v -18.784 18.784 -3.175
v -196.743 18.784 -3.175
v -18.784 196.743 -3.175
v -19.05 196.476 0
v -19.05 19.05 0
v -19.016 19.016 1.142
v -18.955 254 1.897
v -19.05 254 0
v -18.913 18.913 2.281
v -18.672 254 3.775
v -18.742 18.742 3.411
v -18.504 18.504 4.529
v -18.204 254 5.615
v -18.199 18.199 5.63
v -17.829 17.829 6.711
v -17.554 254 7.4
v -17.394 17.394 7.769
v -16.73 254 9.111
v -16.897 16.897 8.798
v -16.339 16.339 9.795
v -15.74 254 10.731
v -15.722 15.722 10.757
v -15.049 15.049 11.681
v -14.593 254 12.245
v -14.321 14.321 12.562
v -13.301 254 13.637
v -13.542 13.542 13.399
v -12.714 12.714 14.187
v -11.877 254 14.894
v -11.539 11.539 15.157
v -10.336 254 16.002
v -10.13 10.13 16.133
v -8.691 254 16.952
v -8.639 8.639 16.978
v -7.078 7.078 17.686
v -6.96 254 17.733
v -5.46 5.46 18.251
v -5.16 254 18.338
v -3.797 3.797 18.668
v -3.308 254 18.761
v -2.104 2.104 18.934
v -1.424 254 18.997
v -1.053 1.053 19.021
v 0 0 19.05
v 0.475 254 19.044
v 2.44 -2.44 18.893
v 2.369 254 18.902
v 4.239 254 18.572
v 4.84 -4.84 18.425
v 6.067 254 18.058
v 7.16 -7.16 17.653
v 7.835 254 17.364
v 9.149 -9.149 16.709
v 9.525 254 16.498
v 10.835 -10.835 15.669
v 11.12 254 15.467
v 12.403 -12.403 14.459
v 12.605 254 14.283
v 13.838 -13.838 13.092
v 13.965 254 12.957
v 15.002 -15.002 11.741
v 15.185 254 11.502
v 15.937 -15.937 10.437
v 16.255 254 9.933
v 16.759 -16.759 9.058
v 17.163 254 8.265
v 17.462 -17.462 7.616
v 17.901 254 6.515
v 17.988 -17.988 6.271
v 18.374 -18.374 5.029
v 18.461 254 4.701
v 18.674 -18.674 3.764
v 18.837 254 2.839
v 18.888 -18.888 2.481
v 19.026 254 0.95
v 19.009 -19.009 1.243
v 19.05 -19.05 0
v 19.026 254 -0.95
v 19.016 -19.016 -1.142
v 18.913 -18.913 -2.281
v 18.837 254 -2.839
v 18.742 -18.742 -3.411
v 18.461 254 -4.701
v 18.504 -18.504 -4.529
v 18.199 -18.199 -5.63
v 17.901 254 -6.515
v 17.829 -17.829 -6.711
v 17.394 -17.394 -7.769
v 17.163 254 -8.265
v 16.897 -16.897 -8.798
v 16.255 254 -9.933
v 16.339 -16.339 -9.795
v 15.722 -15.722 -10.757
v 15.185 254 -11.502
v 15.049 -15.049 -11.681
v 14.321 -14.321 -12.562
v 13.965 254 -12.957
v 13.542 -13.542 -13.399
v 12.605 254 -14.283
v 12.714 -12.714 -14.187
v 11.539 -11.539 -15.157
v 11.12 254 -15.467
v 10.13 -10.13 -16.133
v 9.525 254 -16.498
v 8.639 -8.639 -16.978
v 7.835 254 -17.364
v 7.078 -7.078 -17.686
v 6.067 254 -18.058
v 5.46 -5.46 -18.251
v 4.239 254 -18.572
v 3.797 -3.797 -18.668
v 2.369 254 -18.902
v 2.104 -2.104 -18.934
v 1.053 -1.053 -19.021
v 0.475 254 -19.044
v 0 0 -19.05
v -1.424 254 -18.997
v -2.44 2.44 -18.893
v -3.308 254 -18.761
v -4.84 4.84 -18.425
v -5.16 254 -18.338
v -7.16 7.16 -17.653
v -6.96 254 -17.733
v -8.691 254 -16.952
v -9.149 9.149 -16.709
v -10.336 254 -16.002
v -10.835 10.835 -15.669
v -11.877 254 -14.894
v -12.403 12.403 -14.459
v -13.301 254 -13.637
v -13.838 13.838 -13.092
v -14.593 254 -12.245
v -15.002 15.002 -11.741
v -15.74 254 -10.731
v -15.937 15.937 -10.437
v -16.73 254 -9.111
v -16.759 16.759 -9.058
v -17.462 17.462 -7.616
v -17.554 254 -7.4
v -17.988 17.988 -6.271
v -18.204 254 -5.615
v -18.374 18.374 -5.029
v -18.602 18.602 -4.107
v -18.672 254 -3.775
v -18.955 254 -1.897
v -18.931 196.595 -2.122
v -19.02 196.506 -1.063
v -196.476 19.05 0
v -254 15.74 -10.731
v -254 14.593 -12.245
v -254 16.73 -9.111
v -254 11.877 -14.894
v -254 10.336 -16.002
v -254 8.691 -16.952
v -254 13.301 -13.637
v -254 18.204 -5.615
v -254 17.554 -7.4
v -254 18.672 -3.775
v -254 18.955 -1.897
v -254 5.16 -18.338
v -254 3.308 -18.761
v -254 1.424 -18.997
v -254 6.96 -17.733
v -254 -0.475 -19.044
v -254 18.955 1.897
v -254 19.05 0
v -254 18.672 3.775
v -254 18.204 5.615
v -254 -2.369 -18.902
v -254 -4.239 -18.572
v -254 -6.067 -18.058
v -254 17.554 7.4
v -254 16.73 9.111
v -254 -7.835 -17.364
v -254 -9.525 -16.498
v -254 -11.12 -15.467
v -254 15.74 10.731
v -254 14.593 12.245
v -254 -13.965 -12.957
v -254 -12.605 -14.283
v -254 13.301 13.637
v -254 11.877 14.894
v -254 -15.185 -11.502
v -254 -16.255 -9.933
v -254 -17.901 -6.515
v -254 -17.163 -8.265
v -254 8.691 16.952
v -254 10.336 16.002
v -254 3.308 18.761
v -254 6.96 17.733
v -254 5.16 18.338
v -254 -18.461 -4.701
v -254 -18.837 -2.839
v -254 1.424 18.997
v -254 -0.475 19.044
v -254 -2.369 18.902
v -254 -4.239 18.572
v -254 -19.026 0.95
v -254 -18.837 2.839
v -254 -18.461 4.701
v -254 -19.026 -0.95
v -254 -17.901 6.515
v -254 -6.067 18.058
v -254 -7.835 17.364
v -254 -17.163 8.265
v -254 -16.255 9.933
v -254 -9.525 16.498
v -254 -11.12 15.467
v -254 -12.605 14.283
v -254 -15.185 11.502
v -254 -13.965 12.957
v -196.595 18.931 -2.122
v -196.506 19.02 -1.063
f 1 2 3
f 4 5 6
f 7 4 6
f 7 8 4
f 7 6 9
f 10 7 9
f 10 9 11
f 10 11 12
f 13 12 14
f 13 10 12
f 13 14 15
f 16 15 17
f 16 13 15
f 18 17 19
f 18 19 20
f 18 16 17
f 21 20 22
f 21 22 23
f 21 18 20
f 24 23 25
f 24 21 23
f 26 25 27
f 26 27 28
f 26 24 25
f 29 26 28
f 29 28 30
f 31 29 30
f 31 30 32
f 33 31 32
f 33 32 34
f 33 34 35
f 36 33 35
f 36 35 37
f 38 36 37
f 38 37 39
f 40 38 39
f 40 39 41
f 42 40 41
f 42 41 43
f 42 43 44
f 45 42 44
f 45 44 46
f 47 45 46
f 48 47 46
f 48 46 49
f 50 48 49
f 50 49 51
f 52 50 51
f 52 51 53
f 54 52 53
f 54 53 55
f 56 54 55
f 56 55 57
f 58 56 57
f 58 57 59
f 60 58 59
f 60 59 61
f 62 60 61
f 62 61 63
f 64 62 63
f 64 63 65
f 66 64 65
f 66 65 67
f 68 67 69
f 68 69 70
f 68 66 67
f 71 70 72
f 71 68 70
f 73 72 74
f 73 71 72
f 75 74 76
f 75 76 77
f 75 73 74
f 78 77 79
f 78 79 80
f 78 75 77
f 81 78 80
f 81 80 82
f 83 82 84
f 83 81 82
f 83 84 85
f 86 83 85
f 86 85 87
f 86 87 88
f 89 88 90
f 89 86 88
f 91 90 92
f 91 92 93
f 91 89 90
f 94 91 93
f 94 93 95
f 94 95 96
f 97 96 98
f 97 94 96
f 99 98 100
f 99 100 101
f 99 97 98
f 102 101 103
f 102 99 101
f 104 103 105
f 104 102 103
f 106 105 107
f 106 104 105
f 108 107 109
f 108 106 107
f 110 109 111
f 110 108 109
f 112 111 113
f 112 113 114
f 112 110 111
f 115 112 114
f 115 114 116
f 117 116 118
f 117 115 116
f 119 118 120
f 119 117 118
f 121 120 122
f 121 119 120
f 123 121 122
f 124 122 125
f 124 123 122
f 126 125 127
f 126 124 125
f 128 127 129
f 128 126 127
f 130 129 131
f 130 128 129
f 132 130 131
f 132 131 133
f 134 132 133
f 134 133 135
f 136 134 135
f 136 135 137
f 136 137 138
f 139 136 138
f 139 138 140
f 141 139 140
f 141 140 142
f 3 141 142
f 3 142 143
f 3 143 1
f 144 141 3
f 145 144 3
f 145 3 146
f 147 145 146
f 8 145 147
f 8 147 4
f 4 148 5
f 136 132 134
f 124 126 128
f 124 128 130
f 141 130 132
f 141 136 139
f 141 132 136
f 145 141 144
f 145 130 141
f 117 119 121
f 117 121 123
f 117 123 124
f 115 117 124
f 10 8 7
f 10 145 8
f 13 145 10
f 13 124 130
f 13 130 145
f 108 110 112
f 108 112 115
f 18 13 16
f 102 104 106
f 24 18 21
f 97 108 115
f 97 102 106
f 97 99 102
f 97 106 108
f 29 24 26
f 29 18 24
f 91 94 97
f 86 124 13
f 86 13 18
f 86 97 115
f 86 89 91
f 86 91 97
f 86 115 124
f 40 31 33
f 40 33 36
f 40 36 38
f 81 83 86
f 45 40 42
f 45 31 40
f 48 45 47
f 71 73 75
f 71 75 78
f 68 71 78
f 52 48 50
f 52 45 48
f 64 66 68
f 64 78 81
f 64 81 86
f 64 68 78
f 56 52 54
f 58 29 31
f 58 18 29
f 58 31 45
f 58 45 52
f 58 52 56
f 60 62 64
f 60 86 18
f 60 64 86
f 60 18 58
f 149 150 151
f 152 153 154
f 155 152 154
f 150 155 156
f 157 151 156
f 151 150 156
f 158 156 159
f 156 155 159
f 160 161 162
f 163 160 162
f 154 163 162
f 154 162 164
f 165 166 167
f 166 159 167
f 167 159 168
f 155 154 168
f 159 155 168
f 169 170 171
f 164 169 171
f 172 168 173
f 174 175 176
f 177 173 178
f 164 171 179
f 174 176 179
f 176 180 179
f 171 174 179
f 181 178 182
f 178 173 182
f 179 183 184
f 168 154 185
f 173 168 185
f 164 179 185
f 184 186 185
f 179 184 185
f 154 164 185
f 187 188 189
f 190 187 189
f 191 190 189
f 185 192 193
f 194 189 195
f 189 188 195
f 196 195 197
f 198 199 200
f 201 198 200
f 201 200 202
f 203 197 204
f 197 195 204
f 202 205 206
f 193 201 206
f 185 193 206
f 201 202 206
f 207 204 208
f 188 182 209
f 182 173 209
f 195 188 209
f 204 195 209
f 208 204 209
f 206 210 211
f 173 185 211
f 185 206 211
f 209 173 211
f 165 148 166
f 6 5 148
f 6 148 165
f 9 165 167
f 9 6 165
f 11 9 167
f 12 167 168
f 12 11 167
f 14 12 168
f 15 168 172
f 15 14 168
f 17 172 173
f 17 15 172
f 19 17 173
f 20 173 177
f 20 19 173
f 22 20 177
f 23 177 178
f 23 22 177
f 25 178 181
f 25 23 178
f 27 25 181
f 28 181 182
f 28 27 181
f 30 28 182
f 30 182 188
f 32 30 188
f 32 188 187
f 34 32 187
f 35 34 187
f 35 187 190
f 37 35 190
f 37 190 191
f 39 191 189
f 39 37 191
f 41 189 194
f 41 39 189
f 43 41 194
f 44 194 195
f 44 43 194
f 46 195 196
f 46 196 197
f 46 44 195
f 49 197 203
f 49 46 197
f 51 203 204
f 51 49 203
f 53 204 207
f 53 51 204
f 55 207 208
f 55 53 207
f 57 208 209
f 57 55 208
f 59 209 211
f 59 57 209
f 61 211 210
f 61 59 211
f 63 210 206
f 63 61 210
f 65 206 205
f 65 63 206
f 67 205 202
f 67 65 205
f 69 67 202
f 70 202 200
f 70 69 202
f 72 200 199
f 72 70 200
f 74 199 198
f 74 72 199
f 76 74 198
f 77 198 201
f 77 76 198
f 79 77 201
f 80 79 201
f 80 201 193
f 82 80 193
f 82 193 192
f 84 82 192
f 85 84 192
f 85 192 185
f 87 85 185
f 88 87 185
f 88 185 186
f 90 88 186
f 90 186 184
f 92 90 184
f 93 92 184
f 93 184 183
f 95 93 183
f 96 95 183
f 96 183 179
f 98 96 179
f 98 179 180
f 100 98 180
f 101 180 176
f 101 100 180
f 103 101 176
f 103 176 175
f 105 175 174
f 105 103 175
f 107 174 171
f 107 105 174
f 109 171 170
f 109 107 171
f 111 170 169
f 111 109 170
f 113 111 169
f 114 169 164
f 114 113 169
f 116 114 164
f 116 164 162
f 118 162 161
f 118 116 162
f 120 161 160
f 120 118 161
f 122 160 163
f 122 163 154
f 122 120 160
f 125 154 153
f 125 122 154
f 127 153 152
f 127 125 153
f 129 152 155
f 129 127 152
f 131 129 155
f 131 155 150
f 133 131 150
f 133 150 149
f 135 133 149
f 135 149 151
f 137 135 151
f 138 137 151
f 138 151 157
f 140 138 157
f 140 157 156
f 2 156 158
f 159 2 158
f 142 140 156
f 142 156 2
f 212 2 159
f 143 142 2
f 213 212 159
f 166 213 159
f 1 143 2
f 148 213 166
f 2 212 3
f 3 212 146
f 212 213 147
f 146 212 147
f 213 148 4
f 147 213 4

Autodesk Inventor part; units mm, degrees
ref_plane "YZ Plane" through (0, 0, 0) normal (1, 0, 0) x (0, 1, 0)
ref_plane "XZ Plane" through (0, 0, 0) normal (0, 1, 0) x (-1, 0, 0)
sketch "Sketch1" plane through (0, 0, 0) normal (0, 0, 1) x (1, 0, 0)
  line L0 (-254, 0) -> (0, 0)
  line L1 (0, 0) -> (0, 254)
  line L2 (-215.5261, 0) -> (0, 215.5261)
  dimension "d0" = 254
  dimension "d1" = 254
  dimension "d2" = 90
  dimension "d5" = 152.4
  dimension "d6" = 45
ref_plane "Work Plane1" through (-254, 0, 0) normal (1, 0, 0) x (0, 1, 0)
sketch "Sketch2" plane through (-254, 0, 0) normal (1, 0, 0) x (0, 1, 0)
  circle A0 centre (0, 0) radius 19.05
  dimension "d3" = 38.1
sweep "Sweep1" add profiles "Sketch2" path "Sketch1" path curves L0 L1
extrude "Extrusion1" add sketch "Sketch1" against normal blind 3.175
properties part number "corner_prop"
